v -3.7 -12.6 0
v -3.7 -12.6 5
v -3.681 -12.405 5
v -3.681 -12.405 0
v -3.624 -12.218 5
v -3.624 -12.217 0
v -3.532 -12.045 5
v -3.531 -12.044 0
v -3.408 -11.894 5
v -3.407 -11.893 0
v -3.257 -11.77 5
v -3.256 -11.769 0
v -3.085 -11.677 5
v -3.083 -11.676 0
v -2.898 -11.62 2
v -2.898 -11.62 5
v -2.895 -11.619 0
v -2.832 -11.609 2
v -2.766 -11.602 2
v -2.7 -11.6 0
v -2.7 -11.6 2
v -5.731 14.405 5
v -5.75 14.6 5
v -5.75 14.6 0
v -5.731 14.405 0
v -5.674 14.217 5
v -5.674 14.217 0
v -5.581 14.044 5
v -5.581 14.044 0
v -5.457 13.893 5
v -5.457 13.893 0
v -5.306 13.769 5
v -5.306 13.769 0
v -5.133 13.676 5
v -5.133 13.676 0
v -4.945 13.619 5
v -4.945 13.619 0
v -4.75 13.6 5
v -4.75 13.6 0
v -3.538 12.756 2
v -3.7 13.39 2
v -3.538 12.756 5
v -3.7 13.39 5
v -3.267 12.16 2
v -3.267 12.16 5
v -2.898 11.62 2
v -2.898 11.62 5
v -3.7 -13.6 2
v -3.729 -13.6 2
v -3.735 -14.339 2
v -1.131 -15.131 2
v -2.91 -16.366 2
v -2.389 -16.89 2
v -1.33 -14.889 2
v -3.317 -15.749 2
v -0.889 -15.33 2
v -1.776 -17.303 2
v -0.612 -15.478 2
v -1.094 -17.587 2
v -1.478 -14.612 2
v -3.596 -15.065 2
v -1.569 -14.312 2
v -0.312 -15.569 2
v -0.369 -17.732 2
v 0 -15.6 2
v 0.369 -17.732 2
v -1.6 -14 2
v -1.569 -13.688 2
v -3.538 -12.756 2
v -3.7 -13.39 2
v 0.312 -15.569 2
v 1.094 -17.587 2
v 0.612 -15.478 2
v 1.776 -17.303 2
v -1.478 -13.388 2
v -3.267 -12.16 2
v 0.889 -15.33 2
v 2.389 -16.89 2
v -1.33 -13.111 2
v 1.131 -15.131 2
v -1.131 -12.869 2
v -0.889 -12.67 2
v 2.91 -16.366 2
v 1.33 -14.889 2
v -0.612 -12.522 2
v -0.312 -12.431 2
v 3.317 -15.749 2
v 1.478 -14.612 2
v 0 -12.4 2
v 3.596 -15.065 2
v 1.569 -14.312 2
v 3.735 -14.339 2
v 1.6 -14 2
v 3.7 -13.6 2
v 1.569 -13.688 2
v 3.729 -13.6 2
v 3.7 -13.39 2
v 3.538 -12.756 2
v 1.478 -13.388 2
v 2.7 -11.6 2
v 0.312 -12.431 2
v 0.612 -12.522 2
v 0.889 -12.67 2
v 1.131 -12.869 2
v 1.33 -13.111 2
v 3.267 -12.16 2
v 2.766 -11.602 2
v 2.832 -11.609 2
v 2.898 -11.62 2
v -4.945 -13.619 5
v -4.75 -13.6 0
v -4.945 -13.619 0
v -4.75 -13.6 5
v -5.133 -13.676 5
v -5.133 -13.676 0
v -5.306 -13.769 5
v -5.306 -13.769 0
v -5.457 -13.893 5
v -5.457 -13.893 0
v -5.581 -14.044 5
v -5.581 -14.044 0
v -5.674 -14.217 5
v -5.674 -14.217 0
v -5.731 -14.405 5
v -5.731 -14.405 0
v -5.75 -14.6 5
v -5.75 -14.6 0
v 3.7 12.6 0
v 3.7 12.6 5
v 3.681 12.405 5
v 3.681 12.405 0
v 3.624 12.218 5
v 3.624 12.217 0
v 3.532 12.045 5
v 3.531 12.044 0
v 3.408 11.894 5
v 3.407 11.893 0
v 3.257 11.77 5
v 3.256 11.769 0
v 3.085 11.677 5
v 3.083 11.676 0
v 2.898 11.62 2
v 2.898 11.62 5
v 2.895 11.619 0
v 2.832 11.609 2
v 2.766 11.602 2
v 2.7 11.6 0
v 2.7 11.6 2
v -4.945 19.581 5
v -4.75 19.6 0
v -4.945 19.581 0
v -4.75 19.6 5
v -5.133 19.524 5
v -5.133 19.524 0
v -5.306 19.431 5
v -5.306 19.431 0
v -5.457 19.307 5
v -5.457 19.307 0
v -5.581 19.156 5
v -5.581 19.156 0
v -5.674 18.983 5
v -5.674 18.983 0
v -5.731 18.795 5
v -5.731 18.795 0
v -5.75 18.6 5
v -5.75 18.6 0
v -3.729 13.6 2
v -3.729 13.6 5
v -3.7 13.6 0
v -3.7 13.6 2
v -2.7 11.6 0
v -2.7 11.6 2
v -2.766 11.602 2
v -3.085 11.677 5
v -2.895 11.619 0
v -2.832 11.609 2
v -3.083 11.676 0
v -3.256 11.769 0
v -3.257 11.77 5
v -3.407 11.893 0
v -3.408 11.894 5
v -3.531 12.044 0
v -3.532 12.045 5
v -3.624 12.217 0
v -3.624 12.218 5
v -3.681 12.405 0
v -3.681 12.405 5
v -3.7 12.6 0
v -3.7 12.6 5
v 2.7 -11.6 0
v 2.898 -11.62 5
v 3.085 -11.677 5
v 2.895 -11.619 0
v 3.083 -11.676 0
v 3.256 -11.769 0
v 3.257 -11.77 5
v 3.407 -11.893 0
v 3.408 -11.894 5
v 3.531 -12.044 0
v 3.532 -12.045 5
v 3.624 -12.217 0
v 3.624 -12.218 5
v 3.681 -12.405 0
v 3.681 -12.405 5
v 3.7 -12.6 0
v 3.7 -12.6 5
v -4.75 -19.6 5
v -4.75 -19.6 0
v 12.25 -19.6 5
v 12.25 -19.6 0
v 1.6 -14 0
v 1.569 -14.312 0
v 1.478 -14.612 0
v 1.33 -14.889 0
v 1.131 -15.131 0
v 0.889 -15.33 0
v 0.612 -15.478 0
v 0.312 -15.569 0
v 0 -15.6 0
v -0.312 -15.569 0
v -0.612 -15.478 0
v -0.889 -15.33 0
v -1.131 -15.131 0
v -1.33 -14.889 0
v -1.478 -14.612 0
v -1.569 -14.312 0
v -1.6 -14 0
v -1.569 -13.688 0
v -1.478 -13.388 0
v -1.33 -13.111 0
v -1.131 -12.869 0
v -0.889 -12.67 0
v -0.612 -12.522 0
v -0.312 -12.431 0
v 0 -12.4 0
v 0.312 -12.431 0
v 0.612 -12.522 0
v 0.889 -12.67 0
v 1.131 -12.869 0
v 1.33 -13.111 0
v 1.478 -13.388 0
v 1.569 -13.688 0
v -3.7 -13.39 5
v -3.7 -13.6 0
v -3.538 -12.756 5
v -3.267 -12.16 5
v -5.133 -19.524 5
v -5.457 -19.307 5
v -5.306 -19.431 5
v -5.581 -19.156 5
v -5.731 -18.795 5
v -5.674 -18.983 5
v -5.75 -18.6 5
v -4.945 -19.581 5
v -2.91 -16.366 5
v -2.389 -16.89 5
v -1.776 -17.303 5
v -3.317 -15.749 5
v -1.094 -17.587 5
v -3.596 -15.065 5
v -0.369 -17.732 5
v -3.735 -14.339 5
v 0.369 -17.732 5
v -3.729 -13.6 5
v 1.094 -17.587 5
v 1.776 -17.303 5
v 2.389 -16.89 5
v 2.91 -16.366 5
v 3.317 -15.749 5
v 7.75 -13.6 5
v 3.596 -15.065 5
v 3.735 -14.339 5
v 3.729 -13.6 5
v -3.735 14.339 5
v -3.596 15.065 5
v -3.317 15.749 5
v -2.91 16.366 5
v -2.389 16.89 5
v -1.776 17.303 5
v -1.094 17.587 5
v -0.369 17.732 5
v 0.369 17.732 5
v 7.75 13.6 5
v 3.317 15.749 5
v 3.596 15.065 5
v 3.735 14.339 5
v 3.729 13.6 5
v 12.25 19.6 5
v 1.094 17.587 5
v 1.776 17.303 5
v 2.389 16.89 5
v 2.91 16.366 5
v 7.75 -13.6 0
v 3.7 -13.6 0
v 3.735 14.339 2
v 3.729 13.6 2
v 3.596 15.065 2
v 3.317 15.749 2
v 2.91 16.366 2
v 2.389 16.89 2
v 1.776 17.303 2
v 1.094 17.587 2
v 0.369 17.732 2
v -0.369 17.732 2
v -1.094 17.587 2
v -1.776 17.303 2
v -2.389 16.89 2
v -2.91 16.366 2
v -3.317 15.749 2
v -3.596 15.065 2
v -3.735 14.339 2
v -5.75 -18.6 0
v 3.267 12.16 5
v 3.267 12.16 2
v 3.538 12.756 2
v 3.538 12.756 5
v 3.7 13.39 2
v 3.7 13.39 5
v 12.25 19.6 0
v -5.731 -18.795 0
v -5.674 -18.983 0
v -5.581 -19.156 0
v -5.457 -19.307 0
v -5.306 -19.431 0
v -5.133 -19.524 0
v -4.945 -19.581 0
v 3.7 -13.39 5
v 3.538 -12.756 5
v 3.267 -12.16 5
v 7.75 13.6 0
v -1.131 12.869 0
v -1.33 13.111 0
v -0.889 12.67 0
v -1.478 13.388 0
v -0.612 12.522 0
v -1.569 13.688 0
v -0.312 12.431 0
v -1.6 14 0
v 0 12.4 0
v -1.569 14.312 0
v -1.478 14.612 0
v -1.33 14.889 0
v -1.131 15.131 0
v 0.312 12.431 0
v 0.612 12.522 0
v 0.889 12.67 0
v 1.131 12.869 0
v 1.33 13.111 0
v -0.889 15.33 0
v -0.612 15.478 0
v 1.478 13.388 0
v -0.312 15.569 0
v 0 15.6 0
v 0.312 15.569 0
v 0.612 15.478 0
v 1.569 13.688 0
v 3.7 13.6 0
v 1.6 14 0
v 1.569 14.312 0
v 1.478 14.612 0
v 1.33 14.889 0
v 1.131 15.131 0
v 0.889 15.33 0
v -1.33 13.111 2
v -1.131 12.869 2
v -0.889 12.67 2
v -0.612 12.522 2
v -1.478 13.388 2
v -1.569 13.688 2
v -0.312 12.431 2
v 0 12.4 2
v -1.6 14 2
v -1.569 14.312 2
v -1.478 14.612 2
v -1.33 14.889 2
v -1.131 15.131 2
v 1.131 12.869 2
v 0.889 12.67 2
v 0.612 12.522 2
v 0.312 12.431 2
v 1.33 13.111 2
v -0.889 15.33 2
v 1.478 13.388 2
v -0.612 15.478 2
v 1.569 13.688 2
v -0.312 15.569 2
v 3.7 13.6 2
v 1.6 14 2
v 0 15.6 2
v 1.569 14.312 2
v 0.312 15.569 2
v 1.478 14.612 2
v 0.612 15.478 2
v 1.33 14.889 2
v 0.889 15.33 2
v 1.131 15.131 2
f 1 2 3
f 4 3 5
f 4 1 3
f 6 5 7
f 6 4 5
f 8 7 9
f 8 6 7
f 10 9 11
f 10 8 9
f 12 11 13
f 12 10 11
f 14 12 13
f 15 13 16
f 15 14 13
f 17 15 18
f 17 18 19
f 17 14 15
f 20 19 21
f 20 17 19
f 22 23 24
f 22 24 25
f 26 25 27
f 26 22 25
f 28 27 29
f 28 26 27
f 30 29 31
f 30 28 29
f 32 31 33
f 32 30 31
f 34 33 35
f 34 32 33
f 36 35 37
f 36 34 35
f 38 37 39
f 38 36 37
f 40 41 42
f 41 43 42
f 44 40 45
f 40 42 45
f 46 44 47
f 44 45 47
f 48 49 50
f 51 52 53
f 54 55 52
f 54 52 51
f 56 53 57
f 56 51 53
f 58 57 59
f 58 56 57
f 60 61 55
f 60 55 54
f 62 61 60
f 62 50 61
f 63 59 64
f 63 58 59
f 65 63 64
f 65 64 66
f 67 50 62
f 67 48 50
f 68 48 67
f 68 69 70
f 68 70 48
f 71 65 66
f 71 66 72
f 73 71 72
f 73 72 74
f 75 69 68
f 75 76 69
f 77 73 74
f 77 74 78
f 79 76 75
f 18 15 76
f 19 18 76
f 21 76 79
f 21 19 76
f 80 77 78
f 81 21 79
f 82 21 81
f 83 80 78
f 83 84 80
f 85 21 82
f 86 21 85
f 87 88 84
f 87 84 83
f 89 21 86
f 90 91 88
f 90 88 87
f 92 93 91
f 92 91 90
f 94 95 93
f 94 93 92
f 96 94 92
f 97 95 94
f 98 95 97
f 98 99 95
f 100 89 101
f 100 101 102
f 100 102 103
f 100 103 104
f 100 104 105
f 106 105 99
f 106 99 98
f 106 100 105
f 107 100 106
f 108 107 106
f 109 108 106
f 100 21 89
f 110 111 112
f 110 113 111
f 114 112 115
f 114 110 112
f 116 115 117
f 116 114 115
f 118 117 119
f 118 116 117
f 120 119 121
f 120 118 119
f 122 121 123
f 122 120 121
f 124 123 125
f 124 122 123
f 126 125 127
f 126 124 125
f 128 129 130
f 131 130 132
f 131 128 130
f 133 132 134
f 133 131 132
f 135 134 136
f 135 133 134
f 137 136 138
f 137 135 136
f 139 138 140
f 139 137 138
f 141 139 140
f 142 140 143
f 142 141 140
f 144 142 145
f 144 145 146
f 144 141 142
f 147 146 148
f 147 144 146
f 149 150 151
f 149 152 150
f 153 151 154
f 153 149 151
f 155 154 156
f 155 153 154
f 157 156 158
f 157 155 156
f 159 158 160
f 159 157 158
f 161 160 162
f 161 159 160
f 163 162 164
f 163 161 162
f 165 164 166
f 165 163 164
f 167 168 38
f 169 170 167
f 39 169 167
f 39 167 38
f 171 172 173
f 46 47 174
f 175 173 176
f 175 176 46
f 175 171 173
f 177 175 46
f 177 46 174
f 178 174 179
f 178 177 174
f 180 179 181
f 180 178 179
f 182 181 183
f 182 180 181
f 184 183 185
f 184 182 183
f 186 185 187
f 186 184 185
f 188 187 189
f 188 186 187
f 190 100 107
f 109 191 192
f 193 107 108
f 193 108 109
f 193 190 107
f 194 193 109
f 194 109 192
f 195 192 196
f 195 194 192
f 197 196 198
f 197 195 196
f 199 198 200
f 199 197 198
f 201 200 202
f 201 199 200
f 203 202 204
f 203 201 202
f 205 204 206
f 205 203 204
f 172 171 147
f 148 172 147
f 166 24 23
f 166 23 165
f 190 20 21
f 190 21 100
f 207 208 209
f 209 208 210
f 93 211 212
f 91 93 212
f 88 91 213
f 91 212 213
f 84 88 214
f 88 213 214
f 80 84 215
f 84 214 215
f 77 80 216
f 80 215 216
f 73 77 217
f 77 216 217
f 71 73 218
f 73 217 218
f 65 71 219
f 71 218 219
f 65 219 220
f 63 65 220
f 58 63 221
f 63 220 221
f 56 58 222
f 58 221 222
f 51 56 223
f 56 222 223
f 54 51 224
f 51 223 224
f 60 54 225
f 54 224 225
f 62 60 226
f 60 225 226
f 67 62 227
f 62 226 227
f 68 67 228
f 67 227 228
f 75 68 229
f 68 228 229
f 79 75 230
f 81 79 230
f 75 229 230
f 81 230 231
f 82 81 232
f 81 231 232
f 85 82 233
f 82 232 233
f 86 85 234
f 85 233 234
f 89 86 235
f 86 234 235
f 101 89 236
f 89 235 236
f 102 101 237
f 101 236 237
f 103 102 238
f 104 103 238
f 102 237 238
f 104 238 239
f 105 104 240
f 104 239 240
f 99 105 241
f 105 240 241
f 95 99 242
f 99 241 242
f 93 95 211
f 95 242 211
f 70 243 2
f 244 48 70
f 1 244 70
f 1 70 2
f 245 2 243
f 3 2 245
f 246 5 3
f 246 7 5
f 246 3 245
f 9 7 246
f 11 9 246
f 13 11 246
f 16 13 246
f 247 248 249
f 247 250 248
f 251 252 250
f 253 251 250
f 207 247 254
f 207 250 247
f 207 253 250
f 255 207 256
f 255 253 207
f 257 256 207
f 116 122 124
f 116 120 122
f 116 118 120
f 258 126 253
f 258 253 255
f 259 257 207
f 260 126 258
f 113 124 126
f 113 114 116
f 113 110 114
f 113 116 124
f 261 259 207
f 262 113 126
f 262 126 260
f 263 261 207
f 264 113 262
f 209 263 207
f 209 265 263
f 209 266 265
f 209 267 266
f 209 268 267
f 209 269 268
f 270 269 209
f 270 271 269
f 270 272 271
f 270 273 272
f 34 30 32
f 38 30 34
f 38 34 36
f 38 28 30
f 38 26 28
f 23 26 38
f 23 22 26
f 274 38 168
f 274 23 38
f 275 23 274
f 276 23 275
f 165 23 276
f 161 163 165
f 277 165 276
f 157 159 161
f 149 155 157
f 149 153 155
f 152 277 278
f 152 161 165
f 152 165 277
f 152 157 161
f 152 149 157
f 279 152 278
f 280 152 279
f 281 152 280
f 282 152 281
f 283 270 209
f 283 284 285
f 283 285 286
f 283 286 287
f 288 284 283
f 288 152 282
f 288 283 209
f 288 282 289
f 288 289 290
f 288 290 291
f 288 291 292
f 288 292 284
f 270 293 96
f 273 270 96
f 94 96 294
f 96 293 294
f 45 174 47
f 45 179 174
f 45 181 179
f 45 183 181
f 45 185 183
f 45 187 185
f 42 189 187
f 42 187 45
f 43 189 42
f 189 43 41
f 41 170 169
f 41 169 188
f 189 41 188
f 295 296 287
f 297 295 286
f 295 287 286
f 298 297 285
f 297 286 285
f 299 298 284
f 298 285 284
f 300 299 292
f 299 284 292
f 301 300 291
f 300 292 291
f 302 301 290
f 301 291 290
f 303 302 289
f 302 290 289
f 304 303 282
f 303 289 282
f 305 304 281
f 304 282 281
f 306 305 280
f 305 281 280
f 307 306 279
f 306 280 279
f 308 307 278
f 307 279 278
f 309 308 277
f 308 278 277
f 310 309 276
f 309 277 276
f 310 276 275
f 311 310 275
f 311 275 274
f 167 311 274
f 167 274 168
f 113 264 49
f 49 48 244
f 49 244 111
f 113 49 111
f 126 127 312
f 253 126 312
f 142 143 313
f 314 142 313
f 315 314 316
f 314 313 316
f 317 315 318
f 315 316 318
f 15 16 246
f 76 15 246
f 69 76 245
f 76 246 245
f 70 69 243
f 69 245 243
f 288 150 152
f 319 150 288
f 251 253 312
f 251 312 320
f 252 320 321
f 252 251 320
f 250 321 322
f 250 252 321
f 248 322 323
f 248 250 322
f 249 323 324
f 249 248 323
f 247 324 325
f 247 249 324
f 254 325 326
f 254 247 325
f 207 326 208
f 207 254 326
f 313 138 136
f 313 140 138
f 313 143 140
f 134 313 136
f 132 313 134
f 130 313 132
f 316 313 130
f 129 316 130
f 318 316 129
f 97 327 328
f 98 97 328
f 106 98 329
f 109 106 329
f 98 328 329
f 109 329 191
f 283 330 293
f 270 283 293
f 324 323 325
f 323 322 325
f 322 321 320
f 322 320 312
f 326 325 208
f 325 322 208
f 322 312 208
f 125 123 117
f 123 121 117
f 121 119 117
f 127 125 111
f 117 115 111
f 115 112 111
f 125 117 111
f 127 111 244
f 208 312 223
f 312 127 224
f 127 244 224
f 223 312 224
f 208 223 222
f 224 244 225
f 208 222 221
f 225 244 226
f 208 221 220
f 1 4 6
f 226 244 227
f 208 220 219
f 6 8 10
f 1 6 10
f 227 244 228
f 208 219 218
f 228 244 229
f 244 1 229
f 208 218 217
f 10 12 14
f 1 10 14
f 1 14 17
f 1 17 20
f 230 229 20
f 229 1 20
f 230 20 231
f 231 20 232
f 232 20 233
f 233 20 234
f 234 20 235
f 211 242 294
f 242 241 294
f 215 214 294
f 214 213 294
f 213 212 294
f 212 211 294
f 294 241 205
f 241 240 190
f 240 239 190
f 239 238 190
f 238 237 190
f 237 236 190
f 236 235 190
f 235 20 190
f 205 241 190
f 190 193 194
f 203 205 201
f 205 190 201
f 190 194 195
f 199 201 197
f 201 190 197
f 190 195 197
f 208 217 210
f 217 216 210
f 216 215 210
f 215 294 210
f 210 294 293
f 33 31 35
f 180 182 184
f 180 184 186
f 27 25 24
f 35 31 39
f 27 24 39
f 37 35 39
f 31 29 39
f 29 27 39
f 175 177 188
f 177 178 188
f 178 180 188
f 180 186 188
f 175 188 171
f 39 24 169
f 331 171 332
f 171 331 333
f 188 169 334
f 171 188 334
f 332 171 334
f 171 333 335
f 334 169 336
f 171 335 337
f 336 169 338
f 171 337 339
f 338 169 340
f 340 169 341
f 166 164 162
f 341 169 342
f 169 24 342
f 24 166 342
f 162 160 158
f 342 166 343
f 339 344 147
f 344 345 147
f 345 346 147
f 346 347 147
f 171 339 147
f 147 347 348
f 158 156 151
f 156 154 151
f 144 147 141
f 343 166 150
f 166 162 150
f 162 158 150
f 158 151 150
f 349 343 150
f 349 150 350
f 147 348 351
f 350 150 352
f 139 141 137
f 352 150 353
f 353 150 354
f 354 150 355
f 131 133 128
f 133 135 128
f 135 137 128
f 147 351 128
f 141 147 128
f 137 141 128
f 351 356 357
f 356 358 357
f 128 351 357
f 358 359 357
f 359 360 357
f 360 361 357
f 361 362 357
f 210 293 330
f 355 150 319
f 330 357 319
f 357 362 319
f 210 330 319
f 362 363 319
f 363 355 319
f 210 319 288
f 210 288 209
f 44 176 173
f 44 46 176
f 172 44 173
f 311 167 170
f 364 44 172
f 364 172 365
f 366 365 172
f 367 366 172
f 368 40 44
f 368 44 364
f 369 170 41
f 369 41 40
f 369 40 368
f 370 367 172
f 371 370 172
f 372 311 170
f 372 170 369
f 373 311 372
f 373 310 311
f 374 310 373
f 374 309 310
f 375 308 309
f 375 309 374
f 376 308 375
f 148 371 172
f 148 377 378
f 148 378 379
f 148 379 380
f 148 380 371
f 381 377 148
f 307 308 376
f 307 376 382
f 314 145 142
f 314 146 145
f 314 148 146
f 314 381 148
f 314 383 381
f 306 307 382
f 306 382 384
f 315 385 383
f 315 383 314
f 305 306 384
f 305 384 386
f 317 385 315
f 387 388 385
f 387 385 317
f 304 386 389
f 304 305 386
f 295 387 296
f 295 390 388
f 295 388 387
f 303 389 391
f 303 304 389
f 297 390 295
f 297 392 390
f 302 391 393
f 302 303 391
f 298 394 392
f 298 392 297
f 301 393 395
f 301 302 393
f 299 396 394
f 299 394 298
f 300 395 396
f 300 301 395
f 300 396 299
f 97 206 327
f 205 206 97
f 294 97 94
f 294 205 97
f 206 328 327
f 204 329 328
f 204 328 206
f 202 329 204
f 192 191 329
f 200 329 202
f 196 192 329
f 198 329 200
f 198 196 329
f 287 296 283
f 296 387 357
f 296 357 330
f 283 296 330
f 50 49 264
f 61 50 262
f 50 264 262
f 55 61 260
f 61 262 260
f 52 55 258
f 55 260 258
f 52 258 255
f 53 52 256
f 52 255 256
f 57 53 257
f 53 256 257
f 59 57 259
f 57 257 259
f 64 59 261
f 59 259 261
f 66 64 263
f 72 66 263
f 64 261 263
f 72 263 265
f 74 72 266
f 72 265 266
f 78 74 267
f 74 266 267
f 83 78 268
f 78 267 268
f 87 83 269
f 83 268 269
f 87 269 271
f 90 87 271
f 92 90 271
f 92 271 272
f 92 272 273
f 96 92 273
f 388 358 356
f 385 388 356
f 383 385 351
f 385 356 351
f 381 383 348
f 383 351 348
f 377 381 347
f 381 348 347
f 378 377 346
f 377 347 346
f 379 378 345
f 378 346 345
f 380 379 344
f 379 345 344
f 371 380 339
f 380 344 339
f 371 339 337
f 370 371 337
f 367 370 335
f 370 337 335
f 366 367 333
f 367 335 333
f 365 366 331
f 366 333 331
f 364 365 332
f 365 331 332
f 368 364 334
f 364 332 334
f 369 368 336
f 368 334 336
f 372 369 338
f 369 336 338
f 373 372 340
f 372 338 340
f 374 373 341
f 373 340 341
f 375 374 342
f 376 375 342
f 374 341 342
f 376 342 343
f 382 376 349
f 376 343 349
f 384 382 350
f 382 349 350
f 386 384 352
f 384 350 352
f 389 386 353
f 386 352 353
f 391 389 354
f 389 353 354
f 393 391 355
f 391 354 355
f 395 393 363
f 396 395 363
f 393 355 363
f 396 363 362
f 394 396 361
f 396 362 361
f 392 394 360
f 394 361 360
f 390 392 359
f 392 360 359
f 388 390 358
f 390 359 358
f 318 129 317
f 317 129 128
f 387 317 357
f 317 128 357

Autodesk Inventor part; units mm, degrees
ref_plane "YZ Plane" through (0, 0, 0) normal (1, 0, 0) x (0, 1, 0)
ref_plane "XZ Plane" through (0, 0, 0) normal (0, 1, 0) x (-1, 0, 0)
ref_plane "XY Plane" through (0, 0, 0) normal (0, 0, 1) x (1, 0, 0)
sketch "Esquisse1" plane through (0, 0, 0) normal (0, 0, 1) x (1, 0, 0)
  line L0 (-6, 11.6) -> (6, 11.6) construction
  line L1 (6, 11.6) -> (6, -11.6) construction
  line L2 (6, -11.6) -> (-6, -11.6) construction
  line L3 (-6, -11.6) -> (-6, 11.6) construction
  line L4 (-6, 11.6) -> (6, -11.6) construction
  line L5 (-6, -11.6) -> (6, 11.6) construction
  line L6 (-3.7, -11.6) -> (3.7, -11.6)
  line L7 (3.7, -11.6) -> (3.7, -13.6)
  line L8 (-3.7, -13.6) -> (-3.7, -11.6)
  line L9 (-5.75, -19.6) -> (6.25, -19.6)
  line L10 (-5.75, -13.6) -> (-5.75, -19.6)
  line L11 (5.75, -13.6) -> (3.7, -13.6)
  line L12 (-3.7, -13.6) -> (-5.75, -13.6)
  circle A0 centre (0, -14) radius 1.6
  line L13 (-3.7, -13.6) -> (0, -14) construction
  line L14 (0, -14) -> (3.7, -13.6) construction
  line L15 (-6, 0) -> (6, 0) construction
  line L16 (6, 0) -> (28.3304, 0) construction
  line L17 (7.75, 0) -> (7.75, -13.6)
  line L18 (12.25, -19.6) -> (12.25, 0)
  line L19 (5.75, -13.6) -> (7.75, -13.6)
  line L20 (6.25, -19.6) -> (12.25, -19.6)
  line L21 (6, -11.6) -> (6, 11.6) construction
  line L22 (6, 11.6) -> (-6, 11.6) construction
  line L23 (-6, 11.6) -> (-6, -11.6) construction
  line L24 (-6, -11.6) -> (6, 11.6) construction
  line L25 (-6, 11.6) -> (6, -11.6) construction
  line L26 (-3.7, 11.6) -> (3.7, 11.6)
  line L27 (3.7, 11.6) -> (3.7, 13.6)
  line L28 (-3.7, 13.6) -> (-3.7, 11.6)
  line L29 (-5.75, 19.6) -> (6.25, 19.6)
  line L30 (-5.75, 13.6) -> (-5.75, 19.6)
  line L31 (5.75, 13.6) -> (3.7, 13.6)
  line L32 (-3.7, 13.6) -> (-5.75, 13.6)
  circle A1 centre (0, 14) radius 1.6
  line L33 (-3.7, 13.6) -> (0, 14) construction
  line L34 (0, 14) -> (3.7, 13.6) construction
  line L35 (7.75, 0) -> (7.75, 13.6)
  line L36 (12.25, 19.6) -> (12.25, 0)
  line L37 (5.75, 13.6) -> (7.75, 13.6)
  line L38 (6.25, 19.6) -> (12.25, 19.6)
  point P0 (0, 0)
  point P1 (0, 0)
  point P2 (0, -11.6)
  point P3 (0, 11.6)
  dimension "d0" = 23.2
  dimension "d1" = 12
  dimension "d2" = 7.4
  dimension "d4" = 2
  dimension "d6" = 2.4
  dimension "d7" = 3.2
  dimension "d8" = 6
  dimension "d9" = 18
  dimension "d10" = 2
  dimension "d11" = 4.5
extrude "Extrusion1" add sketch "Esquisse1" along normal blind 5
sketch "Esquisse2" plane through (0, 0, 5) normal (0, 0, 1) x (1, 0, 0)
  circle A0 centre (0, 14) radius 1.6 construction
  line L0 (12.25, -19.6) -> (12.25, 19.6) construction
  line L1 (3.7, -13.6) -> (3.7, -11.6) construction
  circle A1 centre (0, 14) radius 3.75
  line L2 (12.25, 0) -> (-17.9145, 0) construction
  circle A2 centre (0, -14) radius 3.75
  point P0 (0, 0)
  dimension "d14" = 7.5
extrude "Extrusion2" cut sketch "Esquisse2" against normal blind 3
fillet "Congé1" radius 1 4 edges at (3.7, 11.6, 2.5) (-3.7, 11.6, 2.5) (3.7, -11.6, 2.5) (-3.7, -11.6, 2.5)
fillet "Congé2" radius 1 4 edges at (-5.75, 13.6, 2.5) (-5.75, 19.6, 2.5) (-5.75, -13.6, 2.5) (-5.75, -19.6, 2.5)
properties part number "FixationCorona"
